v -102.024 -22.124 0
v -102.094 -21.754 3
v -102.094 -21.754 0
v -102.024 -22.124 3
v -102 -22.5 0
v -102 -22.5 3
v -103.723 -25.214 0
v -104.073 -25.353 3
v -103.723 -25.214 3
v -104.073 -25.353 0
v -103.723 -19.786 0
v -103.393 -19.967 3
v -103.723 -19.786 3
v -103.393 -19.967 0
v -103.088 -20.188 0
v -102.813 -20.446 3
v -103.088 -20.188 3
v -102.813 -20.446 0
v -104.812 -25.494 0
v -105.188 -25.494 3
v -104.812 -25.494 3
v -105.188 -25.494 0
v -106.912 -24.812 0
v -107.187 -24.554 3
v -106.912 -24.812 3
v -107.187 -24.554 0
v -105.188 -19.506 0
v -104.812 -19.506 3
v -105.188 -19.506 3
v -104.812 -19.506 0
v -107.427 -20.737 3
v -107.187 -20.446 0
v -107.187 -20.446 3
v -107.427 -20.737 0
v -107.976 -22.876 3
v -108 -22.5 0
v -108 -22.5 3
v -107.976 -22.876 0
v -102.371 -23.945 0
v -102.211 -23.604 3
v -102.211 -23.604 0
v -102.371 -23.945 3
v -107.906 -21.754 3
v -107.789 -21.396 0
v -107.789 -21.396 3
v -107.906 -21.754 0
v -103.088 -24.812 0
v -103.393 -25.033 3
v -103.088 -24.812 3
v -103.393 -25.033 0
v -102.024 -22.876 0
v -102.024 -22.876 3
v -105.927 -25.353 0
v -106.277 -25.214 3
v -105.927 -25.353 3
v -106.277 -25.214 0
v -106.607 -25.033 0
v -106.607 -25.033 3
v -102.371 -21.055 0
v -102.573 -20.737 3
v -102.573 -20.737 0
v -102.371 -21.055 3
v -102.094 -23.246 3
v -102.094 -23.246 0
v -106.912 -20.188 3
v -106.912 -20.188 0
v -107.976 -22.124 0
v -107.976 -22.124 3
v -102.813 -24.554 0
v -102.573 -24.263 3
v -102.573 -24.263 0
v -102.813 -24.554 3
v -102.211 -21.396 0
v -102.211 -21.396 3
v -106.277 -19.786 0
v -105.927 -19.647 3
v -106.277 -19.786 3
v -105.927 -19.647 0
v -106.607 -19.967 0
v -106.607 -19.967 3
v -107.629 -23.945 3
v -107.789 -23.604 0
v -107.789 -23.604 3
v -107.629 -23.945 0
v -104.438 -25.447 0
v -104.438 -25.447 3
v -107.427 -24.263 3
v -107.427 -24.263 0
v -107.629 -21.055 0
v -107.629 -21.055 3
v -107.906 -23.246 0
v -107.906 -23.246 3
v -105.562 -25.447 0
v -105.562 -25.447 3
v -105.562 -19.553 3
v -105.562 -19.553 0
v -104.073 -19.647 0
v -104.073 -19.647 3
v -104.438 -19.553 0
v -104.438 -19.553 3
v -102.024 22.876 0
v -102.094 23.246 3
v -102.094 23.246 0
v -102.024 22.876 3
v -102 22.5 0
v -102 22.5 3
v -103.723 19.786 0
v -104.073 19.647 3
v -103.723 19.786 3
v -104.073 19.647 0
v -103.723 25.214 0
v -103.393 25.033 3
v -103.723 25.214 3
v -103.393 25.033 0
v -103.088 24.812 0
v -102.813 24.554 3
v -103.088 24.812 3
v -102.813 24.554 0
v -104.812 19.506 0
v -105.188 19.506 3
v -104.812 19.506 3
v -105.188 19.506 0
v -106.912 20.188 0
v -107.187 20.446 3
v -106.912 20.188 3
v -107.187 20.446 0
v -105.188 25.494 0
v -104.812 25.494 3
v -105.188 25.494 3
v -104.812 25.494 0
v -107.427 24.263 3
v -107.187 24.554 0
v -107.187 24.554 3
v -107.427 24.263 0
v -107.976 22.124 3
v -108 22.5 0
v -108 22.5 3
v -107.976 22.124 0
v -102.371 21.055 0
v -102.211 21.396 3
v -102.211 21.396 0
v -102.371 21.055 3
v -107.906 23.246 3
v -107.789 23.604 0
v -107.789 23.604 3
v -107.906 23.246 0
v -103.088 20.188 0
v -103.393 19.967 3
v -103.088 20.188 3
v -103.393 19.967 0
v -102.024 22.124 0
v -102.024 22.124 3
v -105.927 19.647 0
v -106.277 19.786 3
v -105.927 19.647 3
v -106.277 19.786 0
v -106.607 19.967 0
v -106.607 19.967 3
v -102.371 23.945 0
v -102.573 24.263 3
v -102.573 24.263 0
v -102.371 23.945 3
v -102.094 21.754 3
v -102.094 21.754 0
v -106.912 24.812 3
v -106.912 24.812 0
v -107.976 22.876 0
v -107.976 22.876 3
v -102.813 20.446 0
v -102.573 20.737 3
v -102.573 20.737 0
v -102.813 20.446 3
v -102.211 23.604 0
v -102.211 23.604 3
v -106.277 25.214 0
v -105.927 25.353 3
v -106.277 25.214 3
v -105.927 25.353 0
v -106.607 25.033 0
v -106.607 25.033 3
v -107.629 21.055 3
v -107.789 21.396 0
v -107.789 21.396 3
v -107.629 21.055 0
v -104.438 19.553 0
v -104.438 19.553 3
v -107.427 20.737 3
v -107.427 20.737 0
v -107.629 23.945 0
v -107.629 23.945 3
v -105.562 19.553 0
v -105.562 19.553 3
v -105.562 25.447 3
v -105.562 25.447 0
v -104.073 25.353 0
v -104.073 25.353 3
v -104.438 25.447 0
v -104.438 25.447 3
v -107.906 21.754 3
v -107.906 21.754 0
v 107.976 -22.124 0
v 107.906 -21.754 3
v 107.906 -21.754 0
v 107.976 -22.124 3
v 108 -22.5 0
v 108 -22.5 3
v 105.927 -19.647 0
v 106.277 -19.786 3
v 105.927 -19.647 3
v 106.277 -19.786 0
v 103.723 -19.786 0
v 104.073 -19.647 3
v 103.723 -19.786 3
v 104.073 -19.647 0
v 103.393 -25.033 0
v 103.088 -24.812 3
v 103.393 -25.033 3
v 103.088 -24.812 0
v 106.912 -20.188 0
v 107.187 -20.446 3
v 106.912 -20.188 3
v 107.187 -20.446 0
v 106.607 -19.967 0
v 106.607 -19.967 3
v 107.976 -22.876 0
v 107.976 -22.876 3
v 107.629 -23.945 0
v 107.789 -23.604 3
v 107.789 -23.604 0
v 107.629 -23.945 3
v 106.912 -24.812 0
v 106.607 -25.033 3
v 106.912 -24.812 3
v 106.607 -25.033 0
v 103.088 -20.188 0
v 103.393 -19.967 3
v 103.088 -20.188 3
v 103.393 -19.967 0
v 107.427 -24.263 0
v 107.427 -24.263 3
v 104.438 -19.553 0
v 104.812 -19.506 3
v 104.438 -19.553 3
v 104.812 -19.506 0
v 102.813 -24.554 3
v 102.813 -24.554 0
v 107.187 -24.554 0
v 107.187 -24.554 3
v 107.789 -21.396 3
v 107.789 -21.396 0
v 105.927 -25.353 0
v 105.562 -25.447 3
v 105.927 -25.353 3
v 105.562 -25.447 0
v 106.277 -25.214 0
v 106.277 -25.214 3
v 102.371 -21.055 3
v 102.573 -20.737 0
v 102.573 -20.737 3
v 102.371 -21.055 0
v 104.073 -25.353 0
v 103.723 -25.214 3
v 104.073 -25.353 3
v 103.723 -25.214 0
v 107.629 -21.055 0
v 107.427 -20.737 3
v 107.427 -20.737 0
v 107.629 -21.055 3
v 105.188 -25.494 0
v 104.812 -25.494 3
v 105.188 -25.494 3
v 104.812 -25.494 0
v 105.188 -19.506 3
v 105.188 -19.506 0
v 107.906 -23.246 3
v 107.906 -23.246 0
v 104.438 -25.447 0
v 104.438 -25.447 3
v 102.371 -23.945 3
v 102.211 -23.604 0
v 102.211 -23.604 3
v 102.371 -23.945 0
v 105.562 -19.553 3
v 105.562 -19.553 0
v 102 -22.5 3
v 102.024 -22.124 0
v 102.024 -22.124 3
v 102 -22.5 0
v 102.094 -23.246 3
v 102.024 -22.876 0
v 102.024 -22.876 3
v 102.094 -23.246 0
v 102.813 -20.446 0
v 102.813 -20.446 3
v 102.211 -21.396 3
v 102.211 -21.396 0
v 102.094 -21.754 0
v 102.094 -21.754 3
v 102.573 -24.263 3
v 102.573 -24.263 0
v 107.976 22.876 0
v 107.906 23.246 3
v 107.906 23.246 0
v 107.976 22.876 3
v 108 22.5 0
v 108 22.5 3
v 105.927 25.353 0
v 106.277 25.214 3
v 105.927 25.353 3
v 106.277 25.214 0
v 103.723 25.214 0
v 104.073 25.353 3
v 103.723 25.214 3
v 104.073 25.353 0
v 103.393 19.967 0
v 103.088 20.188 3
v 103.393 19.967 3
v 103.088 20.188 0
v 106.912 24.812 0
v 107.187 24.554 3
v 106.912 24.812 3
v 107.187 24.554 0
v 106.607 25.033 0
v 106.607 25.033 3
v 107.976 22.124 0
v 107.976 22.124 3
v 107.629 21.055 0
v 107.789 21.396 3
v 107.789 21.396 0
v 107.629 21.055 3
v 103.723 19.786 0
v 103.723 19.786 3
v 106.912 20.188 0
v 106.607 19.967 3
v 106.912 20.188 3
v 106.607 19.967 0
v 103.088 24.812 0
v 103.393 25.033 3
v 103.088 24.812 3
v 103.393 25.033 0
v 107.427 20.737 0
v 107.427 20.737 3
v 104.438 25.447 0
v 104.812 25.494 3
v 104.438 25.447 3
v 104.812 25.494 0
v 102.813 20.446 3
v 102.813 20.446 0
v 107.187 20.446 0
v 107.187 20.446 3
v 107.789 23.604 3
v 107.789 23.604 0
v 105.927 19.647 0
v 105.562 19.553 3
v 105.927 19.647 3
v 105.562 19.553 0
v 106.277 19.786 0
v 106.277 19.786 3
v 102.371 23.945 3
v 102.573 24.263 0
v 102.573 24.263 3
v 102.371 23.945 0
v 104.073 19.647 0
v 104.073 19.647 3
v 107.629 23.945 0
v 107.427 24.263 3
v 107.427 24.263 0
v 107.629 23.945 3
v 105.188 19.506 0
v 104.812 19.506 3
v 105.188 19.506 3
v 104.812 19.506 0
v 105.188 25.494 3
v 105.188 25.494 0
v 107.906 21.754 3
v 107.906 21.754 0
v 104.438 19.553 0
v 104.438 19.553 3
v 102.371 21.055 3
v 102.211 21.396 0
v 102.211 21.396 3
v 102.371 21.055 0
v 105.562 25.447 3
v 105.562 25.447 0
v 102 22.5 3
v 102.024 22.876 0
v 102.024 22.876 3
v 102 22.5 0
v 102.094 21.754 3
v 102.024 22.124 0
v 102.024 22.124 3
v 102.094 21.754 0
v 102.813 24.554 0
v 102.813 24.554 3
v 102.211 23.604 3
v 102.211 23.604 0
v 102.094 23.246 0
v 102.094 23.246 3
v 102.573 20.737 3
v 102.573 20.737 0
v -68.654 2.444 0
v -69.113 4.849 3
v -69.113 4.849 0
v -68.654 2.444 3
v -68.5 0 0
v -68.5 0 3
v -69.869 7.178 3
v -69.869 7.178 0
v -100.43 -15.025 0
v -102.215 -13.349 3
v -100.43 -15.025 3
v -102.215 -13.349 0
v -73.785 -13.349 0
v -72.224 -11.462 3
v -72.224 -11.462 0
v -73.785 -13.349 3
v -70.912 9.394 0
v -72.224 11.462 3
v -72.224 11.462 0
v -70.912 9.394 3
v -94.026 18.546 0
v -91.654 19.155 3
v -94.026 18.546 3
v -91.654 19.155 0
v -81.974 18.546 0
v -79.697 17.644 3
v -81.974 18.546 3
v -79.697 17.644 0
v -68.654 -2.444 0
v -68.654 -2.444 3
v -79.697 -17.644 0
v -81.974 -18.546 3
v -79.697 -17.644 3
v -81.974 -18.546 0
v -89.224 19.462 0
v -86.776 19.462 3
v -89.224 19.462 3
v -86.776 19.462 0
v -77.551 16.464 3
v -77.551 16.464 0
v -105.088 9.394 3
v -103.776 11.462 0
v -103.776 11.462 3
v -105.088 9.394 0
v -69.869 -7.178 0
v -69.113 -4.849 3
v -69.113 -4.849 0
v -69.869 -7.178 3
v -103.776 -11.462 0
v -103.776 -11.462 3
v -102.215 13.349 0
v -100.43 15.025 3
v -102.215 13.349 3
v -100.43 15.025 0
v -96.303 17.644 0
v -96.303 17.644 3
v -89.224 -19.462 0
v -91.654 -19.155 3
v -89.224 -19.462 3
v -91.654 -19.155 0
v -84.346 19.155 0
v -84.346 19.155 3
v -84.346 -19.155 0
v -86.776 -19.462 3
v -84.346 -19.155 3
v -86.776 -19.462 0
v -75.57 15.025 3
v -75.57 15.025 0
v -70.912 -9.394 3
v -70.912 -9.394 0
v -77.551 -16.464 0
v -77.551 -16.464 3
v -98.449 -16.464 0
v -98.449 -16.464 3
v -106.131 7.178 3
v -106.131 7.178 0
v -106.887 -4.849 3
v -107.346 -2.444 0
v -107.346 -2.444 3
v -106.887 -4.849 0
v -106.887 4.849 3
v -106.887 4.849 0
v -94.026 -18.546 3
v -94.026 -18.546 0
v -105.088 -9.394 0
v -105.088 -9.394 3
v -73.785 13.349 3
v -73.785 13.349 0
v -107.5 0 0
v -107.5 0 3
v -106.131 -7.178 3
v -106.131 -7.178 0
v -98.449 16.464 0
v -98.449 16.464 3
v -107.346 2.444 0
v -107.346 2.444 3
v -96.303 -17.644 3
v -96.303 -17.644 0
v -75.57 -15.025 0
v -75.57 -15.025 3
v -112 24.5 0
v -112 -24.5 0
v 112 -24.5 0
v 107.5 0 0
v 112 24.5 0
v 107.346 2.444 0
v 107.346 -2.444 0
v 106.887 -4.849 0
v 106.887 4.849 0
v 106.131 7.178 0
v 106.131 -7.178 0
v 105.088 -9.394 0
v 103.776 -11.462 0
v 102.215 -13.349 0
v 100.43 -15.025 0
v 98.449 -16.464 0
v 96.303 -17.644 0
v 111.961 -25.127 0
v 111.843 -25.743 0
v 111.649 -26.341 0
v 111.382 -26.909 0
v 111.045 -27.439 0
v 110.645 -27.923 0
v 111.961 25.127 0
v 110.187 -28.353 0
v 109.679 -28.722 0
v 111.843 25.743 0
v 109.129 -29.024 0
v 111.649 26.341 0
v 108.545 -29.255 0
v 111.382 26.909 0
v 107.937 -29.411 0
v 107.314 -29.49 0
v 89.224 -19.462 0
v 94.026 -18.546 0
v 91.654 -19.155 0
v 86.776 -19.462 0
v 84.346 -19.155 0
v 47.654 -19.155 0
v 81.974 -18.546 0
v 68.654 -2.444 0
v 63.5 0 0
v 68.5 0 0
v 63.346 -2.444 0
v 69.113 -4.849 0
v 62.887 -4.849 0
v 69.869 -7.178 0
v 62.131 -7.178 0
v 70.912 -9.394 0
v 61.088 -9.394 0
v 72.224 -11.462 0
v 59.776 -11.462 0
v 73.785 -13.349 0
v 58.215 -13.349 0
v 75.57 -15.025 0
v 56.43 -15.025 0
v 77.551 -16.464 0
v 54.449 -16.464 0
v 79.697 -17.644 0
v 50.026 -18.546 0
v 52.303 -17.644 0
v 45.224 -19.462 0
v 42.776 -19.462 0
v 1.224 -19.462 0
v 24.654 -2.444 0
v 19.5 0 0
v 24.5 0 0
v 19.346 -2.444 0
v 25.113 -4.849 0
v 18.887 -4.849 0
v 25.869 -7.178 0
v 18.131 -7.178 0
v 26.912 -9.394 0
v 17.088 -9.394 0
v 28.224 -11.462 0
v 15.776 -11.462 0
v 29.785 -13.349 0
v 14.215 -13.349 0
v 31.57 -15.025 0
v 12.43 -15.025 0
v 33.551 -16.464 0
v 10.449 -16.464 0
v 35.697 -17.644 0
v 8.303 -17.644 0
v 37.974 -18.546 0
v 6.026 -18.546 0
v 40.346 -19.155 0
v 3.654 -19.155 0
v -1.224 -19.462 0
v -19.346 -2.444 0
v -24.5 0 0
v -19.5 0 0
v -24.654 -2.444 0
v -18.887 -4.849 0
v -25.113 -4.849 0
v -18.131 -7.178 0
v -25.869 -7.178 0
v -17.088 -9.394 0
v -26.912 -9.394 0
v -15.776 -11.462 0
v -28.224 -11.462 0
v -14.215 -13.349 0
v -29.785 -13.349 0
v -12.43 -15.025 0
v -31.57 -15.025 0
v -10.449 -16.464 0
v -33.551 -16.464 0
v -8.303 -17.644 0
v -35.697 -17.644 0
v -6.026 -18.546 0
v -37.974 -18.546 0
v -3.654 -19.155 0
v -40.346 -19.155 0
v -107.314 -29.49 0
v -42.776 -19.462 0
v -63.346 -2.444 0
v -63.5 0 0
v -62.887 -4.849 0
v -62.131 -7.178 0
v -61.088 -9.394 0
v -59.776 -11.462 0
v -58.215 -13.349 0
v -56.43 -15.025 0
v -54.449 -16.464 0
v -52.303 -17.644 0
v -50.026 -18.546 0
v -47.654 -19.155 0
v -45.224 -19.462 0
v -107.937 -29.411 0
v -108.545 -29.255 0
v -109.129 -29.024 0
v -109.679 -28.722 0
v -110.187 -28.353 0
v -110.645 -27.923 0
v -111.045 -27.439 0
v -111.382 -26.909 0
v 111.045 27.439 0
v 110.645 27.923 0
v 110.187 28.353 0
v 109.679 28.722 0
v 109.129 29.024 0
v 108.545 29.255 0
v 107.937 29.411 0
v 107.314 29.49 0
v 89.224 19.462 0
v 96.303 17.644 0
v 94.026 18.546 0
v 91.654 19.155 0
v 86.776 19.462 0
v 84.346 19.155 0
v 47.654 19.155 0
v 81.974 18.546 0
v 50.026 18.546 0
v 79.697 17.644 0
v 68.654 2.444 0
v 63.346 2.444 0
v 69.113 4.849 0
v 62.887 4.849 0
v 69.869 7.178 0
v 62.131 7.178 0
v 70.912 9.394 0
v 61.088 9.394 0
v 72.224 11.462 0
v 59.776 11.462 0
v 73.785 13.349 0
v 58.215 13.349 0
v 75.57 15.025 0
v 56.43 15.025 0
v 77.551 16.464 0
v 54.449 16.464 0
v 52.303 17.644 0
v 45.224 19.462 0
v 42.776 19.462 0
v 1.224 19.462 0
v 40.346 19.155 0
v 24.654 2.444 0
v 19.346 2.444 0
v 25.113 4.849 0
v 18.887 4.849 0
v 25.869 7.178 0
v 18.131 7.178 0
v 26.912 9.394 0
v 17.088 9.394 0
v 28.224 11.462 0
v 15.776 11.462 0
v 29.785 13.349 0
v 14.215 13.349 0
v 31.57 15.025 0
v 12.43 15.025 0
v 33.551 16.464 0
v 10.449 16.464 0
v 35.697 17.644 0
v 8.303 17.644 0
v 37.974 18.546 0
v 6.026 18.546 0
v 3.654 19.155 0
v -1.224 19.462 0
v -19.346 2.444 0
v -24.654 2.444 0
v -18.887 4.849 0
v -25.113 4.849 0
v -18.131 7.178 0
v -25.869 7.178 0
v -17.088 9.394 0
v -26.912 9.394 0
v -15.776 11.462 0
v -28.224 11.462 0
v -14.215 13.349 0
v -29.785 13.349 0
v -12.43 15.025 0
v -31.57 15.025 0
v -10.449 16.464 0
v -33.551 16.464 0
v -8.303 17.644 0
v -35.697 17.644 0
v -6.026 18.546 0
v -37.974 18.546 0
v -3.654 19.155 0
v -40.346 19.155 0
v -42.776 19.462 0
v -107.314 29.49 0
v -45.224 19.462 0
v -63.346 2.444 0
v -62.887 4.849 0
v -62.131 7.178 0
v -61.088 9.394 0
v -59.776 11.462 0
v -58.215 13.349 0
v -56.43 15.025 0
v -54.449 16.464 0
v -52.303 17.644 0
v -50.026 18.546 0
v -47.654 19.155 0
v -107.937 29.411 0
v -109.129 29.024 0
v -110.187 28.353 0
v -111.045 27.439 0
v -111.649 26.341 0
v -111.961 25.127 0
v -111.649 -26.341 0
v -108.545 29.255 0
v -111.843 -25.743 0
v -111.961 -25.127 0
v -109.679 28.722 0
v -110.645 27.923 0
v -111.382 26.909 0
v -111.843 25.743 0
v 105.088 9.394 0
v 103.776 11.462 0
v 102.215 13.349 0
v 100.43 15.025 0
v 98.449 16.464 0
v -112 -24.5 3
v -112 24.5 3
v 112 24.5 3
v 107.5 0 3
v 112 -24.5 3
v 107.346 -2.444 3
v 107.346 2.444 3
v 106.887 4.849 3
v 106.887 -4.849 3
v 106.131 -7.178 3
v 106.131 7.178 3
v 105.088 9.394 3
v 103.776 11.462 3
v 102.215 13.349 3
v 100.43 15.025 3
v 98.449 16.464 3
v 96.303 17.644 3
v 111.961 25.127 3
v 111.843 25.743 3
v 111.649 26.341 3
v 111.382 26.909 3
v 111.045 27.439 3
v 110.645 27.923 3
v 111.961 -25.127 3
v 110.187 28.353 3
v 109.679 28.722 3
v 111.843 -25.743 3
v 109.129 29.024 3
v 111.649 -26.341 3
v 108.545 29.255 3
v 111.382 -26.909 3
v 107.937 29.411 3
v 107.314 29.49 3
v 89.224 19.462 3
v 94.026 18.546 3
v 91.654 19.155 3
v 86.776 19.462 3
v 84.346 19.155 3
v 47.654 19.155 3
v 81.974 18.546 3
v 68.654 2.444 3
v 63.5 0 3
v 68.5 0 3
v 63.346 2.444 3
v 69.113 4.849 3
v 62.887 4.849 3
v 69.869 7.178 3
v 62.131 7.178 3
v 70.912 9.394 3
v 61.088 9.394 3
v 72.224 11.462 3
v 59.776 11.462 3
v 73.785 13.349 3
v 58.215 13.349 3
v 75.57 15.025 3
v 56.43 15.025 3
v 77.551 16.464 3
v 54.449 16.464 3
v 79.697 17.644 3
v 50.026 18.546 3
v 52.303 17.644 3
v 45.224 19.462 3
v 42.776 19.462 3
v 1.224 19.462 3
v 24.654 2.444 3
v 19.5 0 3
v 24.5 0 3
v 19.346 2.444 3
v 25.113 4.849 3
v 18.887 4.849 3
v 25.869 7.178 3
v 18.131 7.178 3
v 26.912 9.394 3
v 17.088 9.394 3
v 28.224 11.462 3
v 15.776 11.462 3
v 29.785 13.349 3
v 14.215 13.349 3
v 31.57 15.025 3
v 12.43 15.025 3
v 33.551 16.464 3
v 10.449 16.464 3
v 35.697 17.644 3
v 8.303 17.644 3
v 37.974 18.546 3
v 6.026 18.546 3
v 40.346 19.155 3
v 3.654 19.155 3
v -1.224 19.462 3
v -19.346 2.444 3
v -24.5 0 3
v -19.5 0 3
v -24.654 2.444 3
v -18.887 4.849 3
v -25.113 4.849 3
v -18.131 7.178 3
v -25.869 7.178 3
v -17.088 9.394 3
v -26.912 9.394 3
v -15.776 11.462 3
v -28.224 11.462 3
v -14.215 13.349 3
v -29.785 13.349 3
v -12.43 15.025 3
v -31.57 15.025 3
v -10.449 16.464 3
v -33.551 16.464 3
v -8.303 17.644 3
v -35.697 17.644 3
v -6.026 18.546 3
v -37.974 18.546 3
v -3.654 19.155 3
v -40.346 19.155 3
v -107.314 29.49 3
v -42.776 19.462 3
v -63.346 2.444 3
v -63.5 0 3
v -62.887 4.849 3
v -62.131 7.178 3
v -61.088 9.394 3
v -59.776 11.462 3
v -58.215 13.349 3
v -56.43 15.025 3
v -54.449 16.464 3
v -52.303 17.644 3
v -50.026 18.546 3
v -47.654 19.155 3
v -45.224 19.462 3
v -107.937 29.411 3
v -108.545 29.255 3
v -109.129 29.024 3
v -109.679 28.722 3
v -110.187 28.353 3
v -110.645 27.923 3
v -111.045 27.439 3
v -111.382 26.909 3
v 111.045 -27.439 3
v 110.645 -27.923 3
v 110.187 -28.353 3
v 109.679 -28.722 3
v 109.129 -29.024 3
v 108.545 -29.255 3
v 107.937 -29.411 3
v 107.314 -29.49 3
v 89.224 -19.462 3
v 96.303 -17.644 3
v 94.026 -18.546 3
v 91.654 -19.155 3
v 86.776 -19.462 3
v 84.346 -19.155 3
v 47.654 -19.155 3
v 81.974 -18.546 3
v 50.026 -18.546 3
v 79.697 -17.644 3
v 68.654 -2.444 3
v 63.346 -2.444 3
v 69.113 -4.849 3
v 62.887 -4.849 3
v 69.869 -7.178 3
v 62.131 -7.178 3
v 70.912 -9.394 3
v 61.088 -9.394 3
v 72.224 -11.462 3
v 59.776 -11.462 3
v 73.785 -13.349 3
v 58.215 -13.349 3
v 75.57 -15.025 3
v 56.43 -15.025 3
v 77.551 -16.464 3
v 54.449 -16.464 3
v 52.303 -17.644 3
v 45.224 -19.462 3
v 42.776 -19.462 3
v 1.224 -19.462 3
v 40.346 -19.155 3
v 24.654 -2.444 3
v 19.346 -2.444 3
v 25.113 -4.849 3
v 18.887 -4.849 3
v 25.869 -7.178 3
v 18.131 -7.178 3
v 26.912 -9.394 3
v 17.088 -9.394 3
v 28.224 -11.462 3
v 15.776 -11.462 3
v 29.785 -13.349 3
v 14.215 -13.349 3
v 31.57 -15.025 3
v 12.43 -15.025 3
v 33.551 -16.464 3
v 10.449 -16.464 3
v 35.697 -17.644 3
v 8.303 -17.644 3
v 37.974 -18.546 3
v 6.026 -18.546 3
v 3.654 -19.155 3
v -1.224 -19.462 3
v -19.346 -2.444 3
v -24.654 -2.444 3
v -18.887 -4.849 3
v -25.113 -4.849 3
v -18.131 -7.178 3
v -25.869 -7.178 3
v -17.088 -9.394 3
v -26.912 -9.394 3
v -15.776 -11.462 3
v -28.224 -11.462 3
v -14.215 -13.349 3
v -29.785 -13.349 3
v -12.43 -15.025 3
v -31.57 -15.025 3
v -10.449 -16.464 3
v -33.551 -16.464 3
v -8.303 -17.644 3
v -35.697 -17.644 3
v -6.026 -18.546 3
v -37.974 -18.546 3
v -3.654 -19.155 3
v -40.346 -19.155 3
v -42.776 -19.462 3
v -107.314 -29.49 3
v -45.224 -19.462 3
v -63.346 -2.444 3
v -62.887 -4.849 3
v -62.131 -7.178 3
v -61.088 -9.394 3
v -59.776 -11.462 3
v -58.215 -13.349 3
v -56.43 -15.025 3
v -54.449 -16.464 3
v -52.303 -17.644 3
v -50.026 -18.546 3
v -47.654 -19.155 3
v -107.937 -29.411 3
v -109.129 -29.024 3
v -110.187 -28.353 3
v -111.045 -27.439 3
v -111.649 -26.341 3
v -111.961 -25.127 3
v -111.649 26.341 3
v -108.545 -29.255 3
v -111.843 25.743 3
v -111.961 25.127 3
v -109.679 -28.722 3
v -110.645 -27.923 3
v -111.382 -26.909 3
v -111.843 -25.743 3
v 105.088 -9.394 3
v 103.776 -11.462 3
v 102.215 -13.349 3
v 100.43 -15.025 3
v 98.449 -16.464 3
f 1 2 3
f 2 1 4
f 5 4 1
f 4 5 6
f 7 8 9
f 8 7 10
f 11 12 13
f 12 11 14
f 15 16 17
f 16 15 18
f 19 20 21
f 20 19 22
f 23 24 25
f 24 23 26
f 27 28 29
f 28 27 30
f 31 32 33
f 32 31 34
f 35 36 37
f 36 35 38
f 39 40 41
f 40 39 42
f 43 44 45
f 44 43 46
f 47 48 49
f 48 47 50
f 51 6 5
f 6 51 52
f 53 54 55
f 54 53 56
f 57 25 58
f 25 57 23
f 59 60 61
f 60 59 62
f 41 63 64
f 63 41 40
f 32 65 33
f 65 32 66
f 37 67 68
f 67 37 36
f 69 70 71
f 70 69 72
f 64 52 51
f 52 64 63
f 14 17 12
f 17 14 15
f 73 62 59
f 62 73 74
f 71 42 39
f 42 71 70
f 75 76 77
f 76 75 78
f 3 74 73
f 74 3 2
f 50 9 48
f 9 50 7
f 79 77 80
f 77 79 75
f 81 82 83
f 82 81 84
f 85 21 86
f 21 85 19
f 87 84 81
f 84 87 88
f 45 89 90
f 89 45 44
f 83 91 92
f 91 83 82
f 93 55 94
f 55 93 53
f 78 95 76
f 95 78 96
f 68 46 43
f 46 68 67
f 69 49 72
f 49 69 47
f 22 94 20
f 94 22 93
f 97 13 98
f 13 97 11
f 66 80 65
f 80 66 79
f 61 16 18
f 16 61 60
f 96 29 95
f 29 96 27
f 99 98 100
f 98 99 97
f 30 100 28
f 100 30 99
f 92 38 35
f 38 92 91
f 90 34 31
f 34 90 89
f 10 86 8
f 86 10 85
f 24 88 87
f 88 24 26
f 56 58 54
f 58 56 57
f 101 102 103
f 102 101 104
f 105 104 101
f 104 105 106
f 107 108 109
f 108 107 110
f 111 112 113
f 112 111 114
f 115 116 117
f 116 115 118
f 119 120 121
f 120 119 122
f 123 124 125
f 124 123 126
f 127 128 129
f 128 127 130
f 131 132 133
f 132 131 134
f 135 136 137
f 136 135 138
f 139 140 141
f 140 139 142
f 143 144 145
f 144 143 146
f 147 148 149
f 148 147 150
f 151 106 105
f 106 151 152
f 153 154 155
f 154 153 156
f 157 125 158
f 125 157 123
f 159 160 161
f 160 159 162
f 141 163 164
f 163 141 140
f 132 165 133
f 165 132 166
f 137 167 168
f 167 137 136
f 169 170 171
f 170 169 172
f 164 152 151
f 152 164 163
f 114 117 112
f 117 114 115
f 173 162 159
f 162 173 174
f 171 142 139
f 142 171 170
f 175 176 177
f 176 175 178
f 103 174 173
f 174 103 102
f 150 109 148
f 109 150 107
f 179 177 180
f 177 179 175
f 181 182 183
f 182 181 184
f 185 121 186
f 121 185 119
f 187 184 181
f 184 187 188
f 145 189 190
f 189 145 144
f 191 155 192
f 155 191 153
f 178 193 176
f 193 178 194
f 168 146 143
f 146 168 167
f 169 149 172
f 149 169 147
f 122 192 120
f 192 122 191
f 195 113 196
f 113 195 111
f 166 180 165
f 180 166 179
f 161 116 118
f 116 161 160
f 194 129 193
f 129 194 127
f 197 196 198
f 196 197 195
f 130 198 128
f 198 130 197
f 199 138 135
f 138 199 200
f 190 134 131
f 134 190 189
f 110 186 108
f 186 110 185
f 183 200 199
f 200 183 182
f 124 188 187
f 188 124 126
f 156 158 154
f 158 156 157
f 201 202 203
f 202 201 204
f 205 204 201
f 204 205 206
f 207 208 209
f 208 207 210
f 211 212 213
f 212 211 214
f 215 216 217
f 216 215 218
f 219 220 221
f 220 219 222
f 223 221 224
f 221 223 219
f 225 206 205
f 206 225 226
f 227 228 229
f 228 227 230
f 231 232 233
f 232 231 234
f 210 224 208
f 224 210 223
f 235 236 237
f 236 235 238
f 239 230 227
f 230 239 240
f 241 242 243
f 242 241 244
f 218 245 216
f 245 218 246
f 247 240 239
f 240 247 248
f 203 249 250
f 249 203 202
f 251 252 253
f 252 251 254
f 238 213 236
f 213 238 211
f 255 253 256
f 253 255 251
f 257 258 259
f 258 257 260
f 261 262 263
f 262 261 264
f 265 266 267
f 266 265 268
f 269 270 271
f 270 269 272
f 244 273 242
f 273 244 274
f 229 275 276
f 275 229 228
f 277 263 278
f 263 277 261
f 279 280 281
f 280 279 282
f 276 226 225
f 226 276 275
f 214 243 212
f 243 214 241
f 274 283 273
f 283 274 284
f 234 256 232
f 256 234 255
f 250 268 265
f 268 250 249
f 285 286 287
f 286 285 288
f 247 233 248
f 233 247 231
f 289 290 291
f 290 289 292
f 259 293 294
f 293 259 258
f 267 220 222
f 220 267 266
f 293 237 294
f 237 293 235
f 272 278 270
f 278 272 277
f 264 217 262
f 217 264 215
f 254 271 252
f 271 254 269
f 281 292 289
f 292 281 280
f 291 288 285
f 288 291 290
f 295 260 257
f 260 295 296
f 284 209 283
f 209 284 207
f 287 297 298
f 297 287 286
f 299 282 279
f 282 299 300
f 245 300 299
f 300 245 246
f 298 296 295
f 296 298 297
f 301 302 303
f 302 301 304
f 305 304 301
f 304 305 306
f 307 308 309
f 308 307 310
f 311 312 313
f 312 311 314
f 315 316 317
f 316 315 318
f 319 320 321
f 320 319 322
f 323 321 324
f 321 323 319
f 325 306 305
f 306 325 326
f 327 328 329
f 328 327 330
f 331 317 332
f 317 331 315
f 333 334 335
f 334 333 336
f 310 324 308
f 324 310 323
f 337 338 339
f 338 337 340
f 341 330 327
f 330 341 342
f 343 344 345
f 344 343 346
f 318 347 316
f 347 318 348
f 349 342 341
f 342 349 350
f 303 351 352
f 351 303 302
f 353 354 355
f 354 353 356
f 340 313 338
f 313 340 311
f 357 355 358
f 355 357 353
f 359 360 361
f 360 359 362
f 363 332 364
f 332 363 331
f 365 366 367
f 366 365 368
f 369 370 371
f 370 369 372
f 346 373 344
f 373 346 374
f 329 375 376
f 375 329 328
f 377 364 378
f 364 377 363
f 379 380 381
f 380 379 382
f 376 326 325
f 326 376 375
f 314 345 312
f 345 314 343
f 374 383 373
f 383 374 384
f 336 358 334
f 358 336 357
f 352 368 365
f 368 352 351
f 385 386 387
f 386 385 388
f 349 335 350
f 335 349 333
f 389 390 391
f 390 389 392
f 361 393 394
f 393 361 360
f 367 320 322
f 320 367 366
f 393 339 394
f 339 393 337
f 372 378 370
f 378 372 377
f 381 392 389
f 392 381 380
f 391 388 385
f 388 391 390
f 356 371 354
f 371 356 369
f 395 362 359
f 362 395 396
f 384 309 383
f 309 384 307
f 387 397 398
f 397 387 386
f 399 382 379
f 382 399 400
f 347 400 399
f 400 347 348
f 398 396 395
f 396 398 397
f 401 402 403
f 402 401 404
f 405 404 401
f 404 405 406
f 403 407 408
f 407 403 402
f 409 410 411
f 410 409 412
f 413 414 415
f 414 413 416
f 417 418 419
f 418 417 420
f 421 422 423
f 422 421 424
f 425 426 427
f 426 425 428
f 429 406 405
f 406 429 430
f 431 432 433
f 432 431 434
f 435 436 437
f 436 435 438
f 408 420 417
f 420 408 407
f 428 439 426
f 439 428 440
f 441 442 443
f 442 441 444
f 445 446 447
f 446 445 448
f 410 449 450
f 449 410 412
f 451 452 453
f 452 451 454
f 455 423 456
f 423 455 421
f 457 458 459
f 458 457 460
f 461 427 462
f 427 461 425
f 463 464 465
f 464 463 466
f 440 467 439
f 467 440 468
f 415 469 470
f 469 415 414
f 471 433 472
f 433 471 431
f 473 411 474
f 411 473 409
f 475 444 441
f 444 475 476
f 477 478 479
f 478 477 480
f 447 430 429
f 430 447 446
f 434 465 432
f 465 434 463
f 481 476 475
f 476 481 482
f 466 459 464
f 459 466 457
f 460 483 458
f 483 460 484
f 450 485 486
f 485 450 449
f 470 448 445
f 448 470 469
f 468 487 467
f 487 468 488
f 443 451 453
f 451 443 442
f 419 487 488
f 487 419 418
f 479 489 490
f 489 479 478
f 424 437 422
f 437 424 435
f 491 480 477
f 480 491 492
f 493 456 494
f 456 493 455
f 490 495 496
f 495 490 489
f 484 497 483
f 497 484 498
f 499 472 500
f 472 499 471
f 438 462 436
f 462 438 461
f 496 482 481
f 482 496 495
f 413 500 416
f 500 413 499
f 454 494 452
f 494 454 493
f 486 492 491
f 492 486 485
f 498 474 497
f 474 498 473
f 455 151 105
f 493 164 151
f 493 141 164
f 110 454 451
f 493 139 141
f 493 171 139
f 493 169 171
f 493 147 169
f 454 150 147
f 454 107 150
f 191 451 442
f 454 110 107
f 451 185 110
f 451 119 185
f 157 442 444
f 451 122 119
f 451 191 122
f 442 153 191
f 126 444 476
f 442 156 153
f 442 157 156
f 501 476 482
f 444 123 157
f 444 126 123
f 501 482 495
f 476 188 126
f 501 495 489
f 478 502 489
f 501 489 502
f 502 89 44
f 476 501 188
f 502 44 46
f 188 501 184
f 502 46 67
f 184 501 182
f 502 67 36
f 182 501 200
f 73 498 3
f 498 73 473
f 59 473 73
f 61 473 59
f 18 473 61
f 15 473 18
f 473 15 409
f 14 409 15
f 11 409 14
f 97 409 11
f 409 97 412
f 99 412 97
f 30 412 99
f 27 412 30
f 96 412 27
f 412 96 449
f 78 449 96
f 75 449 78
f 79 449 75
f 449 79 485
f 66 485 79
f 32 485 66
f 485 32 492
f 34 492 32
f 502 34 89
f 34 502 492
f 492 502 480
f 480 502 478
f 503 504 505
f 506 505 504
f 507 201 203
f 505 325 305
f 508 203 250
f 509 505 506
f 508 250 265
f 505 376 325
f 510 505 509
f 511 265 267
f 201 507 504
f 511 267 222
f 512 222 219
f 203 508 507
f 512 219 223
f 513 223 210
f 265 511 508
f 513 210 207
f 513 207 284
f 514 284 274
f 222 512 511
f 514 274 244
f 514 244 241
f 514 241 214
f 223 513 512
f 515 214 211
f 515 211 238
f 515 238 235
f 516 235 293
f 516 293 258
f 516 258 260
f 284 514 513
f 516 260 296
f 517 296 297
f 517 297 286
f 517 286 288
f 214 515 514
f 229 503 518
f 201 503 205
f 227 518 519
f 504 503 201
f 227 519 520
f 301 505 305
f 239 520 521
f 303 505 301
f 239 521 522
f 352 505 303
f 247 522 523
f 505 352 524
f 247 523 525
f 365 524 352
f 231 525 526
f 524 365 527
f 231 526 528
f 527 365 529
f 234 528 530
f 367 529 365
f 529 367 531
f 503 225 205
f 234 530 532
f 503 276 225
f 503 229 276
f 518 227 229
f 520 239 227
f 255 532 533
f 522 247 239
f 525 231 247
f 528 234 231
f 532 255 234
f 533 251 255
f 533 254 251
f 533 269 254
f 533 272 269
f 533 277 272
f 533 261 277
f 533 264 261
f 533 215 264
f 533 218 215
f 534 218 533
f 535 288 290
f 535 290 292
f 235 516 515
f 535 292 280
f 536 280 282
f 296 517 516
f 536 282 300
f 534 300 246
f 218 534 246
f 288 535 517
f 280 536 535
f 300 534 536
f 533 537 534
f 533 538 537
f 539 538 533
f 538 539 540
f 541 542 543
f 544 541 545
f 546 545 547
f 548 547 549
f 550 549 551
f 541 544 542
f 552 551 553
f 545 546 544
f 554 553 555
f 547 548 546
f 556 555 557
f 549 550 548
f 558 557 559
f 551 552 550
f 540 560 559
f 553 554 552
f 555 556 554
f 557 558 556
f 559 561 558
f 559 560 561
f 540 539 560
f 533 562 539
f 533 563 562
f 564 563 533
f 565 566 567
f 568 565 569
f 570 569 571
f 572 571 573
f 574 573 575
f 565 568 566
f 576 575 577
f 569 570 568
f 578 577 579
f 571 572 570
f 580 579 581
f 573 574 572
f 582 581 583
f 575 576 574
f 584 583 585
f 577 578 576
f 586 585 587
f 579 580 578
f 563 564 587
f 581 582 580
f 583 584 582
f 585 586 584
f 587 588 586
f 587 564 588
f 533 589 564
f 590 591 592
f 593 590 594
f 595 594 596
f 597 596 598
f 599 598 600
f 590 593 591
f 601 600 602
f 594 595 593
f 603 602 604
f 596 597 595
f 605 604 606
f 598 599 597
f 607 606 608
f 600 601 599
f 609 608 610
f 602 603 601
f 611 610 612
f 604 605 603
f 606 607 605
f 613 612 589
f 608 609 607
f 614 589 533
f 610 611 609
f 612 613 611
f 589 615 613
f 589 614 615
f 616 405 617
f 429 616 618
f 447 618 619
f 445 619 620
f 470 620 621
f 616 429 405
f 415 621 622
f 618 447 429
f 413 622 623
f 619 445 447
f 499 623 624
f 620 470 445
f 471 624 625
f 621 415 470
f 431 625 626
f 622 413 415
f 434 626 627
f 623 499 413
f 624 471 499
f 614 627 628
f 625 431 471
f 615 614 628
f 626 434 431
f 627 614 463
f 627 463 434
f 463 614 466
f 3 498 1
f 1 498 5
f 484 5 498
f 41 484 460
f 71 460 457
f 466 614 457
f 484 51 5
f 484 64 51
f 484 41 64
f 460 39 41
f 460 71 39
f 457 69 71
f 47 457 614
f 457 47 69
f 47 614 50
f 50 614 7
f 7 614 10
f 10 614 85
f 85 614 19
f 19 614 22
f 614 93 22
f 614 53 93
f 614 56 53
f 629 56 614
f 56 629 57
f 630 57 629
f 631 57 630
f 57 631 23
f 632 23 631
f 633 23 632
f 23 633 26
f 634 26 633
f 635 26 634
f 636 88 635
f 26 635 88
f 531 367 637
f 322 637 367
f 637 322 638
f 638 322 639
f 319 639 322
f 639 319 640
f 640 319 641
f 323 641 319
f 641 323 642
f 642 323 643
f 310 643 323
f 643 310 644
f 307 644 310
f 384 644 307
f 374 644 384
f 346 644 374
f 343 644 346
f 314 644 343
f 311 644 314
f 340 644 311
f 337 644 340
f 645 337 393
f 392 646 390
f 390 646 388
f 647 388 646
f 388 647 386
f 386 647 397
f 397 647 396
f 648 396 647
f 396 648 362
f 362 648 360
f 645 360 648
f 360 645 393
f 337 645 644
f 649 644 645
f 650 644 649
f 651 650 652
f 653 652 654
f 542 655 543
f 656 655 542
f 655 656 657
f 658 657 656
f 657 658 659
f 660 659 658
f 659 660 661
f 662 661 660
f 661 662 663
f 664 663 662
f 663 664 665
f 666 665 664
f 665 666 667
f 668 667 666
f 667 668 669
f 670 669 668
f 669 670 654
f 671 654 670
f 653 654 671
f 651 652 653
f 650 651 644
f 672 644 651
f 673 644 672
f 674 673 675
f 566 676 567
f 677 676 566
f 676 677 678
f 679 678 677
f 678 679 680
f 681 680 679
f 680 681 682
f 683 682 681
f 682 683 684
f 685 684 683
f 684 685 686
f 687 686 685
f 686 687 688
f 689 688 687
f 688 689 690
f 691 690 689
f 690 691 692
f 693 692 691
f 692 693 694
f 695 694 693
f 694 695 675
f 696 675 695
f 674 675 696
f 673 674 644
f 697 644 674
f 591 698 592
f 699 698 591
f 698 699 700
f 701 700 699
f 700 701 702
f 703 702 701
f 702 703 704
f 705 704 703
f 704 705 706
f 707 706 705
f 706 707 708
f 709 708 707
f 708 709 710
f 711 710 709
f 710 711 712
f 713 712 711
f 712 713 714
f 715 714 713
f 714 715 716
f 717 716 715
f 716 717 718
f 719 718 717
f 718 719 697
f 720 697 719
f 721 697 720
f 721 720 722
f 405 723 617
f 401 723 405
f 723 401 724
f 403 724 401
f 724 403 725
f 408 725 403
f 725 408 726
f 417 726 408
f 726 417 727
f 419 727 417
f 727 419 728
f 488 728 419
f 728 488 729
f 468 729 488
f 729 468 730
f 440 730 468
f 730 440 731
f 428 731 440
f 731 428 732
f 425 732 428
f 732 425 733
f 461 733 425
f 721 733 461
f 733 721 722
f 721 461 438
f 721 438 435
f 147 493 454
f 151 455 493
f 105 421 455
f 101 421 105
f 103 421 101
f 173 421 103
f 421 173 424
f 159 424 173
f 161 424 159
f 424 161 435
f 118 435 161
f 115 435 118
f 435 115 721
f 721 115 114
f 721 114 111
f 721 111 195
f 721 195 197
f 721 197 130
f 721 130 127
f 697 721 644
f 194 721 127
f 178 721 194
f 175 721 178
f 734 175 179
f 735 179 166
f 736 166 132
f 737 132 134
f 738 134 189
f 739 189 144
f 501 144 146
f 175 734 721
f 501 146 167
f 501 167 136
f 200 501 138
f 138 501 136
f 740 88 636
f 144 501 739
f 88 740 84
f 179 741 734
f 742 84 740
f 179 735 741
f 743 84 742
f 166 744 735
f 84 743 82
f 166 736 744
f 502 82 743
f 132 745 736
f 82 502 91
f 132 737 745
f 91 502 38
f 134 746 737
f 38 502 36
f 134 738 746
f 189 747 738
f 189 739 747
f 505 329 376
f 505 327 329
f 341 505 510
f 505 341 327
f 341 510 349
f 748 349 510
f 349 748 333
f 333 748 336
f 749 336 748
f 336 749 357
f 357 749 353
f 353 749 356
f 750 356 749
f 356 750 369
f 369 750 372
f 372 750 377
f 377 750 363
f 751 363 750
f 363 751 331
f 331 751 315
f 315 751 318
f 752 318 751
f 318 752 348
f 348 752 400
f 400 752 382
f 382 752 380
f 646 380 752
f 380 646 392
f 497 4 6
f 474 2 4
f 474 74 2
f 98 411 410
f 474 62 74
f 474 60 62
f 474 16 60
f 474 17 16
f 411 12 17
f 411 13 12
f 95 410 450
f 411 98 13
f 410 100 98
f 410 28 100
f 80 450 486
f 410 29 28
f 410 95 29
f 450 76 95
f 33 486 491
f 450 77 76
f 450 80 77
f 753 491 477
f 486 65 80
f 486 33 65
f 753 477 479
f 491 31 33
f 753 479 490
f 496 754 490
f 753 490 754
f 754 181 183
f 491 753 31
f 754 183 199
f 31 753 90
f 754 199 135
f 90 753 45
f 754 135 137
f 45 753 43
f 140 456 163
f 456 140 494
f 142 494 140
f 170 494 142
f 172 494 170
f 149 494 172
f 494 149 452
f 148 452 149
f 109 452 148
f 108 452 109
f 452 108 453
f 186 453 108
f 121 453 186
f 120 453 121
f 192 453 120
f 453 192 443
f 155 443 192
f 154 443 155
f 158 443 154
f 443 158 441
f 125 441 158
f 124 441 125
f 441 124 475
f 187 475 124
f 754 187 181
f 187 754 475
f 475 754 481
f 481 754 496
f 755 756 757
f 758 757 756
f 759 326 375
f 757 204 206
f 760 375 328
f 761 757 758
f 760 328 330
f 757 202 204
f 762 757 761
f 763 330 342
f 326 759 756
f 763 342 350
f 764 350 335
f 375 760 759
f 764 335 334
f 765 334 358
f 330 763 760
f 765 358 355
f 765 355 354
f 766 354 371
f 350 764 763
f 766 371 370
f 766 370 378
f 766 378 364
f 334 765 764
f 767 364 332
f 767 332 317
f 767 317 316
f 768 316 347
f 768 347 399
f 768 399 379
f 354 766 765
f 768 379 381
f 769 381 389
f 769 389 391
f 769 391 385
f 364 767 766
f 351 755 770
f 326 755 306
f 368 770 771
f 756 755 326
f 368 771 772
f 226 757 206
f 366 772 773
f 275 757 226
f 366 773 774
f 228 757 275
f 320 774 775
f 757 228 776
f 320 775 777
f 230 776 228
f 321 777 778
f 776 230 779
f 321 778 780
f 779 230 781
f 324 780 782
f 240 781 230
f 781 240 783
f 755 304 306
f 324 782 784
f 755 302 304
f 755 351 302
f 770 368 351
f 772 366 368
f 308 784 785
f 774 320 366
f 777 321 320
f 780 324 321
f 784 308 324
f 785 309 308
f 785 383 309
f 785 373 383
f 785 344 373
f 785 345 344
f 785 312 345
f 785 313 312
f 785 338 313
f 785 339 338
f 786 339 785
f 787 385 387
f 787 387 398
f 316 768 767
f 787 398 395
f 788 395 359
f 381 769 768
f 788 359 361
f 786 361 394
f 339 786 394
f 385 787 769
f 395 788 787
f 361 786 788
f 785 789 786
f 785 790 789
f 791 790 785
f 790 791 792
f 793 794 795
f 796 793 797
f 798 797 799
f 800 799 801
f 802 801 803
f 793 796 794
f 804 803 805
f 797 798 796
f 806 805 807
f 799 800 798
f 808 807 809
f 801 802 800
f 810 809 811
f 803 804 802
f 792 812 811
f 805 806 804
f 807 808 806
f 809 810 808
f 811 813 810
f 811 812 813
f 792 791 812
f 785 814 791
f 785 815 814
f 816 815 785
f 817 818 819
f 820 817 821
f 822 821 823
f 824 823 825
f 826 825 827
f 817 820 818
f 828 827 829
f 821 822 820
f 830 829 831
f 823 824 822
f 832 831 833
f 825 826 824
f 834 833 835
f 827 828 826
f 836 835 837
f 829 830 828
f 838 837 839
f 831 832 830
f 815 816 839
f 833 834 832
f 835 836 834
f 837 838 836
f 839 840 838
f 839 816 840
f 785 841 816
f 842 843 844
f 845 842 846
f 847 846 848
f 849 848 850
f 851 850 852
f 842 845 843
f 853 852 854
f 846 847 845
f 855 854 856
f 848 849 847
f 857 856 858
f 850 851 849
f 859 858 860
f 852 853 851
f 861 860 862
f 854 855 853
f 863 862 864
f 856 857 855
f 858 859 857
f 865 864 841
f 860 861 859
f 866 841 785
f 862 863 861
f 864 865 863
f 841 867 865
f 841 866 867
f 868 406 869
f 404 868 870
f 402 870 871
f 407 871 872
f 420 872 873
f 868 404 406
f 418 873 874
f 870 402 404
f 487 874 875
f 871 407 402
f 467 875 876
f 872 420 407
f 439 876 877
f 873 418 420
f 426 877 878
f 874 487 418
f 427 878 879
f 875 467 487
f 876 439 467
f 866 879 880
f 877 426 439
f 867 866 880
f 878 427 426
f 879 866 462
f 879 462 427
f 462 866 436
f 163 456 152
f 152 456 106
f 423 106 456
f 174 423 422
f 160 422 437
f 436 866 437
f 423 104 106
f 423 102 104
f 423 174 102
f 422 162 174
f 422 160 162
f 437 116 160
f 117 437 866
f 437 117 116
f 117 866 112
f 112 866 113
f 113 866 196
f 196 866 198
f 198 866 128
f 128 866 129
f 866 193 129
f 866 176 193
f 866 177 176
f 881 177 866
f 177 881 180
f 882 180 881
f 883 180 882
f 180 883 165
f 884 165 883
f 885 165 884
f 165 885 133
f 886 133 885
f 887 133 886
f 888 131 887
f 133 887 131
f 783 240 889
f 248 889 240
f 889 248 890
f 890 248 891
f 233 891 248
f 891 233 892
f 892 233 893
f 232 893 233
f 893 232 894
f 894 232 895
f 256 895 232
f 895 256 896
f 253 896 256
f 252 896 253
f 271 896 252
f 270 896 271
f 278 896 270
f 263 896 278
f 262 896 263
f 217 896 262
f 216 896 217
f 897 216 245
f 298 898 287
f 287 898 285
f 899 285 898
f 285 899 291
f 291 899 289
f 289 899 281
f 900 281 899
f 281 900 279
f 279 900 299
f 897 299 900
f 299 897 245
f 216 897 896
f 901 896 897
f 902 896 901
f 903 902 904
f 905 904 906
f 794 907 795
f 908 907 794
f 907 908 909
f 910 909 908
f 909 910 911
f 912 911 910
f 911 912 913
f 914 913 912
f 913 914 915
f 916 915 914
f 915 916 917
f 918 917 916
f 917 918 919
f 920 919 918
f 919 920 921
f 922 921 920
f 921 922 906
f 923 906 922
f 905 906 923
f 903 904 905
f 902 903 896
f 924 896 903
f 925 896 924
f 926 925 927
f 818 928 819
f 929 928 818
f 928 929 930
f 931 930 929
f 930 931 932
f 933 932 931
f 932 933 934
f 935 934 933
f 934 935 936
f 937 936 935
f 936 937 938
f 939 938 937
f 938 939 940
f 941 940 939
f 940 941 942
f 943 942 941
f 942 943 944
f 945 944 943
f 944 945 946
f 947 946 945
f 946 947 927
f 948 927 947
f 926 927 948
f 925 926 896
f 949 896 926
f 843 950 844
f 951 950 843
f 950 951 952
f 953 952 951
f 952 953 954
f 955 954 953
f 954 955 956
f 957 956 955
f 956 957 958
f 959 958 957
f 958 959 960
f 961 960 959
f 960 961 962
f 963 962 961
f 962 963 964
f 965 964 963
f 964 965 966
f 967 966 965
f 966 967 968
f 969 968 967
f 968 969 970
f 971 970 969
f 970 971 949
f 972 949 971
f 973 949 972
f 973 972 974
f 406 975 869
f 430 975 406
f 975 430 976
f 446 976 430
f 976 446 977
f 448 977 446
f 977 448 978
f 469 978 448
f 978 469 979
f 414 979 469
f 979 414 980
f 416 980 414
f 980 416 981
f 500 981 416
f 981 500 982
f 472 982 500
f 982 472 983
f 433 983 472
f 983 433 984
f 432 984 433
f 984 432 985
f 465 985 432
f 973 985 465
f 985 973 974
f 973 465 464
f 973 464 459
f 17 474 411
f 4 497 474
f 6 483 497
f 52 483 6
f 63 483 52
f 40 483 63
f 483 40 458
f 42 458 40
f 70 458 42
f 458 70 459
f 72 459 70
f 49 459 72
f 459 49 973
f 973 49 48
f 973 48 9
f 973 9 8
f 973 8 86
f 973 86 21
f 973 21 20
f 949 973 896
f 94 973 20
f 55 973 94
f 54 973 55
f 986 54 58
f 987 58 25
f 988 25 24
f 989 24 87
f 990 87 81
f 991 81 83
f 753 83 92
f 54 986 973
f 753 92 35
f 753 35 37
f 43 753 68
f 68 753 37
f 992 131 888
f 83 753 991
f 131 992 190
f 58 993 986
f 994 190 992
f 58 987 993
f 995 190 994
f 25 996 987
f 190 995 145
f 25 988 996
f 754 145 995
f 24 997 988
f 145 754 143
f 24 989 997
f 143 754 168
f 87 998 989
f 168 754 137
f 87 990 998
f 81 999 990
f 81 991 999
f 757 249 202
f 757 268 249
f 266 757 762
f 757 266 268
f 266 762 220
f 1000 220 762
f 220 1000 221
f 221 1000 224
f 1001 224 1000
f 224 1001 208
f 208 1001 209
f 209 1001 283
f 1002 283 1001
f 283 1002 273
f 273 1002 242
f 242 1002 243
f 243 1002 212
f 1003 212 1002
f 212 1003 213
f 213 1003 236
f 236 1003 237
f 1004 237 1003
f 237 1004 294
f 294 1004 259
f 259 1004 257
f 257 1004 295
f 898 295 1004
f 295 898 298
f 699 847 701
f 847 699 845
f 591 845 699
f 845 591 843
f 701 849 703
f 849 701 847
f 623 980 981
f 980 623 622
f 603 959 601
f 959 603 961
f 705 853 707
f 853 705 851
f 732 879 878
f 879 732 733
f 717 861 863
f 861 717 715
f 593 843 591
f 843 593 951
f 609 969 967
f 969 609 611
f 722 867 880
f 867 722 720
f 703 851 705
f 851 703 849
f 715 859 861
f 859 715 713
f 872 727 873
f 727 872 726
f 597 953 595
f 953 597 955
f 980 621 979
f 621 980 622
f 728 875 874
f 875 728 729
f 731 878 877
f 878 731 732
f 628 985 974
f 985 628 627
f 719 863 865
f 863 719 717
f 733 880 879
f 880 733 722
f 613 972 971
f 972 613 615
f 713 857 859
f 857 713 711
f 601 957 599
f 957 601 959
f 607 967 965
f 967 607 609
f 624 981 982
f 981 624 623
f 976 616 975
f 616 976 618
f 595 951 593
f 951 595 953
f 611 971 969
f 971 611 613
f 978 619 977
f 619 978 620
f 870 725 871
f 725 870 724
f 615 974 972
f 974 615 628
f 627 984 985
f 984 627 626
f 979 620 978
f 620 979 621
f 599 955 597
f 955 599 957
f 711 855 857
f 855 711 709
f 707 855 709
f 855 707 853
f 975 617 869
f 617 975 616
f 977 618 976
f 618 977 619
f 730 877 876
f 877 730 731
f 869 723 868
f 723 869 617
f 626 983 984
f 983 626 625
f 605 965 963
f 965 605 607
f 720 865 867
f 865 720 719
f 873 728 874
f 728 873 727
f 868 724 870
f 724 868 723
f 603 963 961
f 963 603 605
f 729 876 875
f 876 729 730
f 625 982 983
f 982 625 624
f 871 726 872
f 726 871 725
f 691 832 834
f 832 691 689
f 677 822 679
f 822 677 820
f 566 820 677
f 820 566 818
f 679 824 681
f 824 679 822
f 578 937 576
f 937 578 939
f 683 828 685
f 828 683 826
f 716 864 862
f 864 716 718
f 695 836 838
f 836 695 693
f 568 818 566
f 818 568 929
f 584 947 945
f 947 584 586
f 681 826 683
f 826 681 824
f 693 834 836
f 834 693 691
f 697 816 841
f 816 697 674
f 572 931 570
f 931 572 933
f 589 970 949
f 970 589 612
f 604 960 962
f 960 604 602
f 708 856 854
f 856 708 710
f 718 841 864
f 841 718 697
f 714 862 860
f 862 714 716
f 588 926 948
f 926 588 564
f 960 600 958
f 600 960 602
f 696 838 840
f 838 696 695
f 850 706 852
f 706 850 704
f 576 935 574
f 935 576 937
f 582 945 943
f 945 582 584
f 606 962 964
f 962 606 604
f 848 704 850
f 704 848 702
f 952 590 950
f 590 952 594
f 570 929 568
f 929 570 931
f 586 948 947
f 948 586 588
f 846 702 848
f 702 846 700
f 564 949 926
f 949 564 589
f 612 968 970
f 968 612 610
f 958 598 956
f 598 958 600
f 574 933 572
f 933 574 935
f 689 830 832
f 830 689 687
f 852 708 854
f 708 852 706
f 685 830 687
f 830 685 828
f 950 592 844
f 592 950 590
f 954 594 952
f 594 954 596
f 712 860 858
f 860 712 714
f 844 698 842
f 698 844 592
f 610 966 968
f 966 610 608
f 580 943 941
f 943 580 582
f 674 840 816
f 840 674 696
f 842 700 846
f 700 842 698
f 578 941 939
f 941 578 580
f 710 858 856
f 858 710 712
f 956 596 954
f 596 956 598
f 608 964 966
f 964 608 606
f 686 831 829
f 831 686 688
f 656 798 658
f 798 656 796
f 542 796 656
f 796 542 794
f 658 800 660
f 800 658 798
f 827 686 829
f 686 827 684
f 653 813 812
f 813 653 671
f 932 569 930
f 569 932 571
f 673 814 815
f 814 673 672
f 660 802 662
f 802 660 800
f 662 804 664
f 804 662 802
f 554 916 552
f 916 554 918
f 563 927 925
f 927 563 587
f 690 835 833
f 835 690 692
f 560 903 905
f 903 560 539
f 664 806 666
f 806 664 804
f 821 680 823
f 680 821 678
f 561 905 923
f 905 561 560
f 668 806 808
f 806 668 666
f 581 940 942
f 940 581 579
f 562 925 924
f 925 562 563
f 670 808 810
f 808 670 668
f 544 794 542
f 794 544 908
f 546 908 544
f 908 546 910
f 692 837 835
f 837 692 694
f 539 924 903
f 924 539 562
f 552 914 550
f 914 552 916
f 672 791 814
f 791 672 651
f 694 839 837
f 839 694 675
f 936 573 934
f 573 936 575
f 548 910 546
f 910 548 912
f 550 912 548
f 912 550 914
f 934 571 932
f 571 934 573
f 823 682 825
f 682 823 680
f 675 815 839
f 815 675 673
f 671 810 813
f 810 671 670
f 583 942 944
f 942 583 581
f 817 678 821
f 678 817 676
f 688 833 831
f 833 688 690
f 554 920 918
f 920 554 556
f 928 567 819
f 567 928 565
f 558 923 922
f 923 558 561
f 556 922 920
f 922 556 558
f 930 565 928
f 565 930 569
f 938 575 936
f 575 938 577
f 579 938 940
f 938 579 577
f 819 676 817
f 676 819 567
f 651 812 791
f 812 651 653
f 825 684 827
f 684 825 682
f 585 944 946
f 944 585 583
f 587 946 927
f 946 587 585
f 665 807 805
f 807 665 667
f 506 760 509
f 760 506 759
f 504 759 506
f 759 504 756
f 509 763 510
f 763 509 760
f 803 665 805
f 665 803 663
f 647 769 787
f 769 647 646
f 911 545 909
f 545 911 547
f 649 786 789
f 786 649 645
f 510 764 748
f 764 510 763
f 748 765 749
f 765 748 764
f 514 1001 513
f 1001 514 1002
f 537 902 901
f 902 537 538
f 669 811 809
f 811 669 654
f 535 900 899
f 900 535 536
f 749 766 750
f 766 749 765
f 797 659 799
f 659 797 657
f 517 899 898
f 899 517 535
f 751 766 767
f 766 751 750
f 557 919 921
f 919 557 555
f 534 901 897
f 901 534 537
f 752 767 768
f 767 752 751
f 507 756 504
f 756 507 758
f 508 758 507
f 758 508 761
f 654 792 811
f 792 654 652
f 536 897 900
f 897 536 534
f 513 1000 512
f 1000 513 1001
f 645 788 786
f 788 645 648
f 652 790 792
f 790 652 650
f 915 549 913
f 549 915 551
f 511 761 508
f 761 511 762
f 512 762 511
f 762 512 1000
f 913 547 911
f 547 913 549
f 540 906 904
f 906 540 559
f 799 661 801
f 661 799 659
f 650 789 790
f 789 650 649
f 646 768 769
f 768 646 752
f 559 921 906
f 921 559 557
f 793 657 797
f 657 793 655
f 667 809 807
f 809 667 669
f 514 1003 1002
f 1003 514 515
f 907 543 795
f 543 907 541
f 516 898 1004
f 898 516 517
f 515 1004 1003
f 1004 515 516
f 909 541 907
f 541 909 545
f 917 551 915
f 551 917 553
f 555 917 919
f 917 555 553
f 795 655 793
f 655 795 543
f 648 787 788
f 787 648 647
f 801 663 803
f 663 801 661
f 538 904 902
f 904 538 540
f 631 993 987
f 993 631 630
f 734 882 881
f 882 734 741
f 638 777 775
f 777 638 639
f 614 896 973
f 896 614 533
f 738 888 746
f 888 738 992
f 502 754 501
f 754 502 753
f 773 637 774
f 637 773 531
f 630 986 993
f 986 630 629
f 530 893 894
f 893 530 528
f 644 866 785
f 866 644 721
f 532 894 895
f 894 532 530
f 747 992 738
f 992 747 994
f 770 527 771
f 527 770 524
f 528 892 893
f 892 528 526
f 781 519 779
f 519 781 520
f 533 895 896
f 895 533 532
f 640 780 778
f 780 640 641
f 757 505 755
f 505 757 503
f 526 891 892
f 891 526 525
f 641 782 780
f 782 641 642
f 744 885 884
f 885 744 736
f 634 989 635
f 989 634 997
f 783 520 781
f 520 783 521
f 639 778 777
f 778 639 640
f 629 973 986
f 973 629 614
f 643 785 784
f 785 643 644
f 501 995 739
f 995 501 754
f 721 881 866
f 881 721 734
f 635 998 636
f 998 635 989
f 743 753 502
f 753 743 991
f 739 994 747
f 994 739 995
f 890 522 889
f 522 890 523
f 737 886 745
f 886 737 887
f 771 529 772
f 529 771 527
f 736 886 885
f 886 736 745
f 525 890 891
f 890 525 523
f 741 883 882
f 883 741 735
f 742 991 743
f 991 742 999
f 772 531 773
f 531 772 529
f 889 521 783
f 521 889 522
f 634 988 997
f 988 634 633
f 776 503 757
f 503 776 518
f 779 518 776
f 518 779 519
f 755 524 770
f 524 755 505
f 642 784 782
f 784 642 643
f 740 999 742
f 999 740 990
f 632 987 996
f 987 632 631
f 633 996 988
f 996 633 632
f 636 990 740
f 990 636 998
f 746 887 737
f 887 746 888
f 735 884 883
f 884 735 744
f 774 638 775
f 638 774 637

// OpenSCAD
$fn = 50;


difference() {
	union() {
		hull() {
			translate(v = [-107.0000000000, 24.5000000000, 0]) {
				cylinder(h = 3, r = 5);
			}
			translate(v = [107.0000000000, 24.5000000000, 0]) {
				cylinder(h = 3, r = 5);
			}
			translate(v = [-107.0000000000, -24.5000000000, 0]) {
				cylinder(h = 3, r = 5);
			}
			translate(v = [107.0000000000, -24.5000000000, 0]) {
				cylinder(h = 3, r = 5);
			}
		}
	}
	union() {
		#translate(v = [-105.0000000000, -22.5000000000, -100.0000000000]) {
			cylinder(h = 200, r = 3.0000000000);
		}
		#translate(v = [-105.0000000000, 22.5000000000, -100.0000000000]) {
			cylinder(h = 200, r = 3.0000000000);
		}
		#translate(v = [105.0000000000, -22.5000000000, -100.0000000000]) {
			cylinder(h = 200, r = 3.0000000000);
		}
		#translate(v = [105.0000000000, 22.5000000000, -100.0000000000]) {
			cylinder(h = 200, r = 3.0000000000);
		}
		#translate(v = [-88.0000000000, 0, 0]) {
			cylinder(h = 3, r = 19.5000000000);
		}
		#translate(v = [-44.0000000000, 0, 0]) {
			cylinder(h = 3, r = 19.5000000000);
		}
		#cylinder(h = 3, r = 19.5000000000);
		#translate(v = [44.0000000000, 0, 0]) {
			cylinder(h = 3, r = 19.5000000000);
		}
		#translate(v = [88.0000000000, 0, 0]) {
			cylinder(h = 3, r = 19.5000000000);
		}
	}
}
